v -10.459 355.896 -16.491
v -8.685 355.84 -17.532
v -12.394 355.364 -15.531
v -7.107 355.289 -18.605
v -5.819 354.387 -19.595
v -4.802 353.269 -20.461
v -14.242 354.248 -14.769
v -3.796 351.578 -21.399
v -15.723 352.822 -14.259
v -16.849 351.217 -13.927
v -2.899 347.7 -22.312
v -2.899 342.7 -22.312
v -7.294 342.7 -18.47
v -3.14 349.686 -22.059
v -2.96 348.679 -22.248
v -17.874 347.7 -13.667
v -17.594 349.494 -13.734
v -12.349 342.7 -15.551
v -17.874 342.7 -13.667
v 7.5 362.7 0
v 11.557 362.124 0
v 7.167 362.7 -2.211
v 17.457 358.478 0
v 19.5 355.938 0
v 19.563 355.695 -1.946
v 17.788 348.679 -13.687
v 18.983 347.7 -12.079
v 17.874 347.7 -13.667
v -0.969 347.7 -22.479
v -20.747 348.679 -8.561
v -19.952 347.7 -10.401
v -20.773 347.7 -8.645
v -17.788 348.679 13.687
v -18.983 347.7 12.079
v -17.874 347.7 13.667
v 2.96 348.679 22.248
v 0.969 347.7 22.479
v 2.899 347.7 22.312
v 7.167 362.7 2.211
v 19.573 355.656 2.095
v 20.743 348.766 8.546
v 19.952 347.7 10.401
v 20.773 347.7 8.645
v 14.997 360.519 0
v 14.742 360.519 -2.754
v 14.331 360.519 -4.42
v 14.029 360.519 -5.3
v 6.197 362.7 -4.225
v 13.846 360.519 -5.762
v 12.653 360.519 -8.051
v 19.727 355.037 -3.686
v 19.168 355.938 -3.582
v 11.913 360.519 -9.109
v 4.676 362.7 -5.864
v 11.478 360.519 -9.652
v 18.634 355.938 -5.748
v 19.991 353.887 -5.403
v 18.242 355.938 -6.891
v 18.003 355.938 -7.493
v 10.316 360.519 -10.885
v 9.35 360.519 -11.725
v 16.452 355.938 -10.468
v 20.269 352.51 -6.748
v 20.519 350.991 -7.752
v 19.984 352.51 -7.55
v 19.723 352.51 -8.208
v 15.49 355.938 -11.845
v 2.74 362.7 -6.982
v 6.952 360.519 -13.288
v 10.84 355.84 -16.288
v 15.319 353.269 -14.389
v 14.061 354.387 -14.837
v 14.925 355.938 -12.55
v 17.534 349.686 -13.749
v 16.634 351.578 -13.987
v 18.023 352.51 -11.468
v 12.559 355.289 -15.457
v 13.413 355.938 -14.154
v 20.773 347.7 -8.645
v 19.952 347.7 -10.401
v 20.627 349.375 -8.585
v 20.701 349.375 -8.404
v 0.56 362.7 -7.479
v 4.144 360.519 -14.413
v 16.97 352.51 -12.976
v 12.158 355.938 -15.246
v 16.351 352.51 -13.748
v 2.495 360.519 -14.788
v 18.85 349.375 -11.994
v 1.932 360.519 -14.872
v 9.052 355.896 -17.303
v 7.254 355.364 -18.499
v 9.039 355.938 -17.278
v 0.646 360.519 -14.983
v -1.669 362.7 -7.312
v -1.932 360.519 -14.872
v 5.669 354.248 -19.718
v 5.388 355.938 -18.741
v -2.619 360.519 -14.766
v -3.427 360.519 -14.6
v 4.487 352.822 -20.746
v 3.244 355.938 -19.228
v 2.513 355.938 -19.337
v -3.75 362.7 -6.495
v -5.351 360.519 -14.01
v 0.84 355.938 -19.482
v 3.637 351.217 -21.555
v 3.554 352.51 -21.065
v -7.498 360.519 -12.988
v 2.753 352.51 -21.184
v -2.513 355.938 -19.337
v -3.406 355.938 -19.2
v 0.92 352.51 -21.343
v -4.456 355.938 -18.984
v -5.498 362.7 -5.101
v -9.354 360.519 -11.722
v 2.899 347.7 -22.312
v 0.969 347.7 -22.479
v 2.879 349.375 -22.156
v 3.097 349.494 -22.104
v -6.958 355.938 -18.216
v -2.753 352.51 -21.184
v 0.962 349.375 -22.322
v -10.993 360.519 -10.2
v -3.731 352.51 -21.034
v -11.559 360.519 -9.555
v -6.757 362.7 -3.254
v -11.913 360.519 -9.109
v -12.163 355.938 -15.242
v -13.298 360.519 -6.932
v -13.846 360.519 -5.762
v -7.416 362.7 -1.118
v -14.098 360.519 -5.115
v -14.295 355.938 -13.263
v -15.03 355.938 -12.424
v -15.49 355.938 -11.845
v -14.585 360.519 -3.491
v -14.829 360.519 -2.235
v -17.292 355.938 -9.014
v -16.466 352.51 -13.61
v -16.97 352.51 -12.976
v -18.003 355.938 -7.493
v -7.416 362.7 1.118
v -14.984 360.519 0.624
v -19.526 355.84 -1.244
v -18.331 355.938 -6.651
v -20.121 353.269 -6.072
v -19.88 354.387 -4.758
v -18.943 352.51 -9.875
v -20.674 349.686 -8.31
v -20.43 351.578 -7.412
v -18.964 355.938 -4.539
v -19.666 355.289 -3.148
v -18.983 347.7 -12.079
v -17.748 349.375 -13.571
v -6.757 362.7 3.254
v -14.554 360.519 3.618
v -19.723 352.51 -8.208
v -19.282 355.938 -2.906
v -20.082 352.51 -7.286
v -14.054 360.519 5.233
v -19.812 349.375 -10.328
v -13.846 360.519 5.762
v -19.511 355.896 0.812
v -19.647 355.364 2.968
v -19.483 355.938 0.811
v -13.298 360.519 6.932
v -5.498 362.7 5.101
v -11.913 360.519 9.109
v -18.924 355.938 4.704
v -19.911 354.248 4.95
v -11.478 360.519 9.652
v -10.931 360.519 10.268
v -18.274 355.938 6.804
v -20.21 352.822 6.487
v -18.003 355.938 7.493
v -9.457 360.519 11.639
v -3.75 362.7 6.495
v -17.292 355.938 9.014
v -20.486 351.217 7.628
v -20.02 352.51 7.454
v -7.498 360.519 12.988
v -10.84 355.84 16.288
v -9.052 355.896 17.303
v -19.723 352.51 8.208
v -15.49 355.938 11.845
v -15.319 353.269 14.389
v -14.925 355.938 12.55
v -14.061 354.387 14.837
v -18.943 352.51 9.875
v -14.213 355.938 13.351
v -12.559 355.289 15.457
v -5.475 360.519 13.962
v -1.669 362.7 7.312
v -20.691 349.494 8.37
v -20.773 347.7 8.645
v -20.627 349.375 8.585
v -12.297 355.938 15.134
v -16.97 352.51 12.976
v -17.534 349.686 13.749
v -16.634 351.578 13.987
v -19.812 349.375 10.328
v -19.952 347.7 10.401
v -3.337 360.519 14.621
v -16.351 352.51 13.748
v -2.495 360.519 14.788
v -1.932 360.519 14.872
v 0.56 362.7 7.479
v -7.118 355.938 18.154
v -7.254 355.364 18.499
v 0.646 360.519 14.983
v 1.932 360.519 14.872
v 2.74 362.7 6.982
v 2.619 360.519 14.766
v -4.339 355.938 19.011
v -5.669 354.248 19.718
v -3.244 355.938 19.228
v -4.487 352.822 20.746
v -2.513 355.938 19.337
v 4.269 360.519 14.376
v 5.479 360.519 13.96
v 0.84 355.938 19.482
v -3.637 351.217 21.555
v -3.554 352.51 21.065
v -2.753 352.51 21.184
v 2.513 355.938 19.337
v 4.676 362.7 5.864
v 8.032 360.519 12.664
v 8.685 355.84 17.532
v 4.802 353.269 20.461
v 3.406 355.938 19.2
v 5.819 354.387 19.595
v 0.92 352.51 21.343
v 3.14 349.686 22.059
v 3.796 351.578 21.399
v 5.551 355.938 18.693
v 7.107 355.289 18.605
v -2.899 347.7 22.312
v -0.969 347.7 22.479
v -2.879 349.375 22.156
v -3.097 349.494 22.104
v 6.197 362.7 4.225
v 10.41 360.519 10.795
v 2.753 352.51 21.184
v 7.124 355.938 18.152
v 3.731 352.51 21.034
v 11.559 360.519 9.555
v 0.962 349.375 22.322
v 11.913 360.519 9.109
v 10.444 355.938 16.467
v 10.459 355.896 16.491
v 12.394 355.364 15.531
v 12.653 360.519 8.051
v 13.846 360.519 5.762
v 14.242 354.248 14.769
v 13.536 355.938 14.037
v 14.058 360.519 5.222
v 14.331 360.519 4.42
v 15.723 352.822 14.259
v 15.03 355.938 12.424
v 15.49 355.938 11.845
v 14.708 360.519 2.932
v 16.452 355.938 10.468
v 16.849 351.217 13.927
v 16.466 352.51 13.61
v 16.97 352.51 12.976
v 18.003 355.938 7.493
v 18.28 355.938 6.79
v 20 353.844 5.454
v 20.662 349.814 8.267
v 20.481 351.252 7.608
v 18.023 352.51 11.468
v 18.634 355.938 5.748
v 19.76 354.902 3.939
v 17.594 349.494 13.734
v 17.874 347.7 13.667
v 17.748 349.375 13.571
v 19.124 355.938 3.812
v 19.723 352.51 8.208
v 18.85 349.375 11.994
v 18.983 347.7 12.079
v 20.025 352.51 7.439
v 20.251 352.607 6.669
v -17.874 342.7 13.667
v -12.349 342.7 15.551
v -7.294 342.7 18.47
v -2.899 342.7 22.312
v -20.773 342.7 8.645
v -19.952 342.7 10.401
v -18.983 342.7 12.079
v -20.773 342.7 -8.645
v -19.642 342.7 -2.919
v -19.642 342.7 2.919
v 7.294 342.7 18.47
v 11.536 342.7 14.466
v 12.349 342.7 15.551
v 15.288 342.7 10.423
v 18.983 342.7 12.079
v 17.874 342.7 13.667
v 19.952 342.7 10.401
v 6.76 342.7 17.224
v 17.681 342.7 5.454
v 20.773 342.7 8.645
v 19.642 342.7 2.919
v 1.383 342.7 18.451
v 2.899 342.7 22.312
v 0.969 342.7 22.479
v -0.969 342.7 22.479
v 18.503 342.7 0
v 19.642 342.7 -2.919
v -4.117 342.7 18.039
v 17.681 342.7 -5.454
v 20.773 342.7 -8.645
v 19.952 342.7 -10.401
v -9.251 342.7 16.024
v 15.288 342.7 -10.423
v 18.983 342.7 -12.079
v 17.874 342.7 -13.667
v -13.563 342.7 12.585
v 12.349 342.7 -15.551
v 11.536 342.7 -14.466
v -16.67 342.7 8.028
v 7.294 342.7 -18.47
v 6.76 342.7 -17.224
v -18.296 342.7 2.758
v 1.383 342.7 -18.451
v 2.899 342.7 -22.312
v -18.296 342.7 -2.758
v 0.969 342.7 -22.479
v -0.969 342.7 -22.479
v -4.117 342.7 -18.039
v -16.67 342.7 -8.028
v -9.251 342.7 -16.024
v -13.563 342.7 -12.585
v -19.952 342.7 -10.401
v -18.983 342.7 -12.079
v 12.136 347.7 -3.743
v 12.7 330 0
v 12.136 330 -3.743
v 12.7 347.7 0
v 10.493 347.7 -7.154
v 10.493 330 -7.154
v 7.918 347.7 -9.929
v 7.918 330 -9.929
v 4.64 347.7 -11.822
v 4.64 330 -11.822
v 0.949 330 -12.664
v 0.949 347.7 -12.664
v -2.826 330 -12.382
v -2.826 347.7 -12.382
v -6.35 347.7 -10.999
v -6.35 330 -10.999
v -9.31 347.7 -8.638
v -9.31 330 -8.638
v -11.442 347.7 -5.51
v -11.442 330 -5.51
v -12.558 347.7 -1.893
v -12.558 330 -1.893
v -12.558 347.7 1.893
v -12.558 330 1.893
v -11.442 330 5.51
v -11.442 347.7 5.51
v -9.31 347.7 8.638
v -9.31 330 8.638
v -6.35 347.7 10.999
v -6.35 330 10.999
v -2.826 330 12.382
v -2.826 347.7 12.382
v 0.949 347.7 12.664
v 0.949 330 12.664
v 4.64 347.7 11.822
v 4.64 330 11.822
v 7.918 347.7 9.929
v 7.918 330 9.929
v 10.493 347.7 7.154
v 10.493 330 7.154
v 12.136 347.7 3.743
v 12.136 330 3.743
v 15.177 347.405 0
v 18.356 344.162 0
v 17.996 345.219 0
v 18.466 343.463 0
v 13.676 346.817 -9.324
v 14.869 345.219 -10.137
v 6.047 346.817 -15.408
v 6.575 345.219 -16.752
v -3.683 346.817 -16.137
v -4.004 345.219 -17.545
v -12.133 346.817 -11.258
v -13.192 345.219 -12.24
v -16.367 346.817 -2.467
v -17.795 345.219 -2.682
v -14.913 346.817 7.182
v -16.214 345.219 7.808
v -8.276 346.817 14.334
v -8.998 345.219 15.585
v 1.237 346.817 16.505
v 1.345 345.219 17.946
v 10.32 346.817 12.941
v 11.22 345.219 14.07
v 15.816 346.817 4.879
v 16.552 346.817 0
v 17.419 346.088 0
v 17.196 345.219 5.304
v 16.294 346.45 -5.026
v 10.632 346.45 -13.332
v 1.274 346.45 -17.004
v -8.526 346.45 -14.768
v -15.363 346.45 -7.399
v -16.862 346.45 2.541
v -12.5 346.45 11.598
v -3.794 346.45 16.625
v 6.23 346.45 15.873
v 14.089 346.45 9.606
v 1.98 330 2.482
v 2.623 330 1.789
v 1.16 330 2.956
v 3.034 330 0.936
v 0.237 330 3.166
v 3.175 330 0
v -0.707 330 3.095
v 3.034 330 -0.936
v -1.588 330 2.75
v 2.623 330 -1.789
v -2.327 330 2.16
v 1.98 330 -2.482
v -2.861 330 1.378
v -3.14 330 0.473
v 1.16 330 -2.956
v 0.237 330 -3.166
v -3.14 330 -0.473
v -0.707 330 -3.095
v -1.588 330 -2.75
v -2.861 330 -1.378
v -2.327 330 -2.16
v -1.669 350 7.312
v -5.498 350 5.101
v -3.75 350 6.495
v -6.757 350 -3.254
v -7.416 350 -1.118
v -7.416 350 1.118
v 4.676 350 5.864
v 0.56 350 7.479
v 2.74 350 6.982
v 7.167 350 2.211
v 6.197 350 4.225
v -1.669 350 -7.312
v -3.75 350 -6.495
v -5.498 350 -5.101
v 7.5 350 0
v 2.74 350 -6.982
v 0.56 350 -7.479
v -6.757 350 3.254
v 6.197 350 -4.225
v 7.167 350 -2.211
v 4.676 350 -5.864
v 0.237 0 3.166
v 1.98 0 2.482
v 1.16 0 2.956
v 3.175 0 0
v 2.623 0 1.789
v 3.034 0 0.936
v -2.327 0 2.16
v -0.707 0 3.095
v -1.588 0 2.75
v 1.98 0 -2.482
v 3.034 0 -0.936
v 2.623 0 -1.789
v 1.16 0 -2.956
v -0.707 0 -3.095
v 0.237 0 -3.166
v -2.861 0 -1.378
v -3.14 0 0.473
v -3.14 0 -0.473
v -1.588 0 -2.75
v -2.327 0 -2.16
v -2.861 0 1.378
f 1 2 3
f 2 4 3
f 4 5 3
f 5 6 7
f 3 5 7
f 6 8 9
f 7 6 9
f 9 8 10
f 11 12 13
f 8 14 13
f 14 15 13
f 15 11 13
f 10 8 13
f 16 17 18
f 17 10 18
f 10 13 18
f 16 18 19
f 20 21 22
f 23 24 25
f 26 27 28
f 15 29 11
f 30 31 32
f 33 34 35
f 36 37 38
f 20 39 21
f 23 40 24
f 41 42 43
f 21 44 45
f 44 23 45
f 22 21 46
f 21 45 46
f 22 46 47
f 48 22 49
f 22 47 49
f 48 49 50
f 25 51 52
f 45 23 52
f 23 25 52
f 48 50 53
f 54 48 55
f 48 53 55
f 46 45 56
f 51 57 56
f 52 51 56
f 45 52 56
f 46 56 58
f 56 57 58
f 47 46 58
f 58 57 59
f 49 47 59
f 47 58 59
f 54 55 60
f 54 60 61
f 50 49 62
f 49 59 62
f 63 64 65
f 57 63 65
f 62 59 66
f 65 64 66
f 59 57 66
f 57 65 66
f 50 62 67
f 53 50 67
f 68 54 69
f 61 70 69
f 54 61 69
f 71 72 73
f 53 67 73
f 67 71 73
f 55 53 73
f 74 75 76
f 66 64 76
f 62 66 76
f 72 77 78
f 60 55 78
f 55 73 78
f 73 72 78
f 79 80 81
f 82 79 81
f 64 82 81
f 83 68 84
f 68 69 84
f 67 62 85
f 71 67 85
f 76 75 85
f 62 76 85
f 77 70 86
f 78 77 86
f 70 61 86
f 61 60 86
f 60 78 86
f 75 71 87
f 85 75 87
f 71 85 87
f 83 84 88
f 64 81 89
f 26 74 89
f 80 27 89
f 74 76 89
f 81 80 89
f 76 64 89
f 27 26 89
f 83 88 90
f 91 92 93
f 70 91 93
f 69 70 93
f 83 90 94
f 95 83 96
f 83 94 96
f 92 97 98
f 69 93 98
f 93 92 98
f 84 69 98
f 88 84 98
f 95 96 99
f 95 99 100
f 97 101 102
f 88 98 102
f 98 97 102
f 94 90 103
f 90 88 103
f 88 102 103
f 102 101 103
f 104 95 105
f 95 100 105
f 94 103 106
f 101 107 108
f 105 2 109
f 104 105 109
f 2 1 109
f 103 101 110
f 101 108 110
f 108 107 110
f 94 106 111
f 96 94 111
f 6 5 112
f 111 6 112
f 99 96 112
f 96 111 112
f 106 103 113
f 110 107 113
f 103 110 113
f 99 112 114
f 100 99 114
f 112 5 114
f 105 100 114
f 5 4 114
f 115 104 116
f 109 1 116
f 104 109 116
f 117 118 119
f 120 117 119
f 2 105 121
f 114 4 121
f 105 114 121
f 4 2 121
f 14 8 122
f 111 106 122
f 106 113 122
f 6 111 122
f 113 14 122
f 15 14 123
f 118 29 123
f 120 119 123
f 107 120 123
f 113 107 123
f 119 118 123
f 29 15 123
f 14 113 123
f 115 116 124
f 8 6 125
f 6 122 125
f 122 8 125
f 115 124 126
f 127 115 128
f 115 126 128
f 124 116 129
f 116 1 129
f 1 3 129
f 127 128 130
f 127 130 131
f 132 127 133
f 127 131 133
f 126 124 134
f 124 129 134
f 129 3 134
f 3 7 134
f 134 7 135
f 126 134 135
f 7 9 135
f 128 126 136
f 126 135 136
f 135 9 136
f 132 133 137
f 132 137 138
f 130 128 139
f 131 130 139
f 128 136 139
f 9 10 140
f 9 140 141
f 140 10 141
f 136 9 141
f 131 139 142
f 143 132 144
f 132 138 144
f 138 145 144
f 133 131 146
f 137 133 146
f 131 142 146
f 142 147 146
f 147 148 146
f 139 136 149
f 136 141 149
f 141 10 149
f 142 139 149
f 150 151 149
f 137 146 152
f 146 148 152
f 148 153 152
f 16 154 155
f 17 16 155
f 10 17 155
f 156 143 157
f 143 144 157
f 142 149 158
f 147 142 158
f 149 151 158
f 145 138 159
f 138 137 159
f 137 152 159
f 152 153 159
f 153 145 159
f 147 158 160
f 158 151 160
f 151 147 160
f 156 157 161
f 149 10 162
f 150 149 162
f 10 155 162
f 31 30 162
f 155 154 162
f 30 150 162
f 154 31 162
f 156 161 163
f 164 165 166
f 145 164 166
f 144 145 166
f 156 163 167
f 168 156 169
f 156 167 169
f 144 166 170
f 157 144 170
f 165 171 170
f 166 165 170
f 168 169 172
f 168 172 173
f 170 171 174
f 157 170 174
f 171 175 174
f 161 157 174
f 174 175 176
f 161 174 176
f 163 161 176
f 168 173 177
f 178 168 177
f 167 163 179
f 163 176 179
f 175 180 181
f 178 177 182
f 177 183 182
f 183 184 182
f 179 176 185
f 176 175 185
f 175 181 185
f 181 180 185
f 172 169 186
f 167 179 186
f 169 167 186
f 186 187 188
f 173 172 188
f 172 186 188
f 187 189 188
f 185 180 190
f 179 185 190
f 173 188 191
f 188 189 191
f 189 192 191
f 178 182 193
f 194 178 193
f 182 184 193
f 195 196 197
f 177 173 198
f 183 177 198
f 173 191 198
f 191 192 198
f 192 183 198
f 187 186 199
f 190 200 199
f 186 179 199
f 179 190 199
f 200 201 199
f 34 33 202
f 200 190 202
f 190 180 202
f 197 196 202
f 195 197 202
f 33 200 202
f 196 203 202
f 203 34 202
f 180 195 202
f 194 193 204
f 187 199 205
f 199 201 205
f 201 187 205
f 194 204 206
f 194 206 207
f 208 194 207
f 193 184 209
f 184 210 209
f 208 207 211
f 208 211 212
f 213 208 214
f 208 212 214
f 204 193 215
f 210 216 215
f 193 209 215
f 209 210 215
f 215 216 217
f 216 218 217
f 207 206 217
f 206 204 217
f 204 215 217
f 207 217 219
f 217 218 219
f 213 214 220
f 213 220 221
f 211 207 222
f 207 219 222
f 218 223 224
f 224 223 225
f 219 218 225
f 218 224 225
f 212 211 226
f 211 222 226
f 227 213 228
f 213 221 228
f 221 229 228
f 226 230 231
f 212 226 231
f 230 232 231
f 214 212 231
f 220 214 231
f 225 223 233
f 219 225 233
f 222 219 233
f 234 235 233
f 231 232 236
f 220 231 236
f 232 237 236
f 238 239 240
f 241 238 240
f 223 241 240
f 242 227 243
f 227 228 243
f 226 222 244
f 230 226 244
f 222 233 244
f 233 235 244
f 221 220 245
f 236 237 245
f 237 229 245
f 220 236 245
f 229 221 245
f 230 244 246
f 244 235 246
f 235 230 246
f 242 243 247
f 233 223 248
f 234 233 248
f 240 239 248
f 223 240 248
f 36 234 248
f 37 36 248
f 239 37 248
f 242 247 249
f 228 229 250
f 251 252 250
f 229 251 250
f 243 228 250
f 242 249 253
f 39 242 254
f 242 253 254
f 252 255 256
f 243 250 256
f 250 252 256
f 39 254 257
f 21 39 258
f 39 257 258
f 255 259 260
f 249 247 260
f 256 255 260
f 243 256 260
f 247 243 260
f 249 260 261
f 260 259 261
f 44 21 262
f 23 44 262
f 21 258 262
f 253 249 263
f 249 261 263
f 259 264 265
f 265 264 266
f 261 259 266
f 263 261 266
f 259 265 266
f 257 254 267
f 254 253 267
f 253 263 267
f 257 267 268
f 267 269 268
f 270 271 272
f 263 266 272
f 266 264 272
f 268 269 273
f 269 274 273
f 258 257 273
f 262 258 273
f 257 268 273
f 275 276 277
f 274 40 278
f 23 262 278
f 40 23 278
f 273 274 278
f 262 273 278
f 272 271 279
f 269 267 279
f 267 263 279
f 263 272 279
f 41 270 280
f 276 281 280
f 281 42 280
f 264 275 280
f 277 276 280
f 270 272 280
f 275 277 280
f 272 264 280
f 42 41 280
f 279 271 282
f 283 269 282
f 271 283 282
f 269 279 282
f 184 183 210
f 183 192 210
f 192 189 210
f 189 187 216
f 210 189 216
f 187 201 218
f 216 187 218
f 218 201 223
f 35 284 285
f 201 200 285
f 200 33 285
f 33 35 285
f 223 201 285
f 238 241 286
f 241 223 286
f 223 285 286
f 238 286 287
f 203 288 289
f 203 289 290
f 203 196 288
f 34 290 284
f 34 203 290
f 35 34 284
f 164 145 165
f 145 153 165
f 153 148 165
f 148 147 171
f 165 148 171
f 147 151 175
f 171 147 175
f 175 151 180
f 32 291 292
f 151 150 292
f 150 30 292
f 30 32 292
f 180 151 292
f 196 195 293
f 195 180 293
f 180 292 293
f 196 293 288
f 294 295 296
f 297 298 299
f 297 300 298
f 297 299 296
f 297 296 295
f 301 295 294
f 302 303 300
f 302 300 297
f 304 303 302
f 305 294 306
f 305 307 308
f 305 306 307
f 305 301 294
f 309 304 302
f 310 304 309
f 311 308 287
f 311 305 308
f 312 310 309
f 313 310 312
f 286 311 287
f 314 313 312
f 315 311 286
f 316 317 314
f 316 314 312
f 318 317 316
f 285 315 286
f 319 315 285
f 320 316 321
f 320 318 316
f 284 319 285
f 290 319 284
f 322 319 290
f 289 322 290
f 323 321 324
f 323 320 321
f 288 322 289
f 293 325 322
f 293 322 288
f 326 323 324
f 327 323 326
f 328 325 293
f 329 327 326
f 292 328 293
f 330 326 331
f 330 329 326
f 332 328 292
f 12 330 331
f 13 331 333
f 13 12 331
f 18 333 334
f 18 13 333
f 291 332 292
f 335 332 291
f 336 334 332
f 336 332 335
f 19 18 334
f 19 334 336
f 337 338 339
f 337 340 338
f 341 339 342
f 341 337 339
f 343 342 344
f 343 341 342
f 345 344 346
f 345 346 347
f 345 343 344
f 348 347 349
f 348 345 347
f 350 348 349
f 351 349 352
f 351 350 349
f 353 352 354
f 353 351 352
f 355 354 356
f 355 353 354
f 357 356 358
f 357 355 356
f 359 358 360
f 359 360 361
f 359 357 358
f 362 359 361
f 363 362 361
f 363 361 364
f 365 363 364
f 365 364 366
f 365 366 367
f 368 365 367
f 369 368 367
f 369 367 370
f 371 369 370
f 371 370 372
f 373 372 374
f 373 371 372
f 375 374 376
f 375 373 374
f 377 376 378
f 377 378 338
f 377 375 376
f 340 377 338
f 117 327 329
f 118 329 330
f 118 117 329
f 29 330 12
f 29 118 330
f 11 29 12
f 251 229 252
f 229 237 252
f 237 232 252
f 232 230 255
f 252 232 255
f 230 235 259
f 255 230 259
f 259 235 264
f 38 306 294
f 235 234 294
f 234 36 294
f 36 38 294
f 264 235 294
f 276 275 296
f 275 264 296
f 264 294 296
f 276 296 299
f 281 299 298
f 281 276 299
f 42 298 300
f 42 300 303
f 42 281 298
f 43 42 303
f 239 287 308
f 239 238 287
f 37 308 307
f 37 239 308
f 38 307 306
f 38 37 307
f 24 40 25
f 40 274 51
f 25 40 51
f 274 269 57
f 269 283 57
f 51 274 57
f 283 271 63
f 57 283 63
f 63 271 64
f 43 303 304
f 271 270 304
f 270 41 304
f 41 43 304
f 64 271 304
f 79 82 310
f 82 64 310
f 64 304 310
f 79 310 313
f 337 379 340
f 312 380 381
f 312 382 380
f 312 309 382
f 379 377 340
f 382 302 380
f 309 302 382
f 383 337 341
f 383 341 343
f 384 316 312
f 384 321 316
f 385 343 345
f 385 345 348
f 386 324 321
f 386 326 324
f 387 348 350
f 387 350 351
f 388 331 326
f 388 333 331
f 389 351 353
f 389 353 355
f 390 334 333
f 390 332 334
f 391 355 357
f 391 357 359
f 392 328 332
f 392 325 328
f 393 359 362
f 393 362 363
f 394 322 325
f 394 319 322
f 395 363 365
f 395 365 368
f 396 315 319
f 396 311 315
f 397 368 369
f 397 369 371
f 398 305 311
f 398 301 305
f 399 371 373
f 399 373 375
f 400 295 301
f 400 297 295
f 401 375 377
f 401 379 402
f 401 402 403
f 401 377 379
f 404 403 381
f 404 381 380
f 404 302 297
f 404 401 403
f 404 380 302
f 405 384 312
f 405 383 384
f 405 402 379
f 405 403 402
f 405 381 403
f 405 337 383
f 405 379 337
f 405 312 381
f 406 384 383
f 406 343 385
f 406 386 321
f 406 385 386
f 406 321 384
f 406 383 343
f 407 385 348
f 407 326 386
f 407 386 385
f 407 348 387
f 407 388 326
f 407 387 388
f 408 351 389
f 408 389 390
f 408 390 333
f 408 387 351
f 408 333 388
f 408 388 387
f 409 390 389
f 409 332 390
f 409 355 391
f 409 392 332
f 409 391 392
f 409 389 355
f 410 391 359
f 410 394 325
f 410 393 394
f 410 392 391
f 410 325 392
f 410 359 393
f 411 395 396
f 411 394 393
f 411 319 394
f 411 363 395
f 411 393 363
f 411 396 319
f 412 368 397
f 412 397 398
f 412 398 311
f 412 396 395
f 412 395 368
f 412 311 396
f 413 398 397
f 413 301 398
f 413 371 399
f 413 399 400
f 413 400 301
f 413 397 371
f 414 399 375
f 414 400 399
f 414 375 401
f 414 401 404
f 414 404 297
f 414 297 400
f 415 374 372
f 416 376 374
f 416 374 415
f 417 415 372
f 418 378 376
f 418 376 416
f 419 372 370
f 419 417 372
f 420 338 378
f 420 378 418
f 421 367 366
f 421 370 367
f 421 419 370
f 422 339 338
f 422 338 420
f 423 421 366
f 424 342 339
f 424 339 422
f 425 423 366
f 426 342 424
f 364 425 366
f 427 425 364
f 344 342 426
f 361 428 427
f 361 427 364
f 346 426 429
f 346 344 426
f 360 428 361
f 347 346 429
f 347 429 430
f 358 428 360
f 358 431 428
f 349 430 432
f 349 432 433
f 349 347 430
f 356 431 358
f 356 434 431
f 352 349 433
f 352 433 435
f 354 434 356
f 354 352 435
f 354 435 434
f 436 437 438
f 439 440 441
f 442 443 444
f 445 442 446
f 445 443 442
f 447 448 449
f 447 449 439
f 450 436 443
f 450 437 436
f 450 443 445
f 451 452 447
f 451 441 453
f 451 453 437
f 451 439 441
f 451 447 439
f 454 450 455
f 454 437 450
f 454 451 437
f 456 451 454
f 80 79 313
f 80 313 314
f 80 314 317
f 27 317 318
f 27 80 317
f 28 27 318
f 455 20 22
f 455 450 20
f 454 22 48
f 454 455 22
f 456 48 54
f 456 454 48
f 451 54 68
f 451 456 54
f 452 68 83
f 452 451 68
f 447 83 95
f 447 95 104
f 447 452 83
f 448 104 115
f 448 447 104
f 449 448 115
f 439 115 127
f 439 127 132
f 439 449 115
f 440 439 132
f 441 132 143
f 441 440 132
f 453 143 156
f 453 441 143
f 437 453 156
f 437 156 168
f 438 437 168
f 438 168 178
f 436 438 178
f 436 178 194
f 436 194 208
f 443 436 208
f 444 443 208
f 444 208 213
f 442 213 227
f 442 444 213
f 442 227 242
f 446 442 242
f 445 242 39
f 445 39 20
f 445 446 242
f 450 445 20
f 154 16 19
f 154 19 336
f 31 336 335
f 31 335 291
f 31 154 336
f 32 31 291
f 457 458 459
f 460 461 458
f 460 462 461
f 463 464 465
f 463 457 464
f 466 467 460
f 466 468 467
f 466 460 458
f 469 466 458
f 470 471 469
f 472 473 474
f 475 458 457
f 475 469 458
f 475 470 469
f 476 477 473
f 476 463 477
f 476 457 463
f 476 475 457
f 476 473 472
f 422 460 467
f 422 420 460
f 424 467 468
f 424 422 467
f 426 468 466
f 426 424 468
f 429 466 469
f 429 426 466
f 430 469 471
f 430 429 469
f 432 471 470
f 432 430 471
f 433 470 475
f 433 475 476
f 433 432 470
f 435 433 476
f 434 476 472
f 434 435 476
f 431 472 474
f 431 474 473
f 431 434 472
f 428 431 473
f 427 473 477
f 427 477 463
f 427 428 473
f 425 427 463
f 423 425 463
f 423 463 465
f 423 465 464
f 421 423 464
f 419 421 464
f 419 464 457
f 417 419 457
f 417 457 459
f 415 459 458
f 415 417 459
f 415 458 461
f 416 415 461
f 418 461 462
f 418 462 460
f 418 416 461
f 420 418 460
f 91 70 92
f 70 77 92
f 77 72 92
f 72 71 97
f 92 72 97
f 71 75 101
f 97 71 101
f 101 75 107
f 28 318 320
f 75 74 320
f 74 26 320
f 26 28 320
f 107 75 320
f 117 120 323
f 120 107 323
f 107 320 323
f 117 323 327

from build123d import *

# Parameters (mm, degrees)
CORTAR_EXTRUIR1_DEPTH = 345.174069344


with BuildPart() as part:
    # Croquis2 → Revolución1 (revolve)
    with BuildSketch(Plane.XY):
        with BuildLine():
            Line((3.175, 330), (12.7, 330))
            Line((12.7, 330), (12.7, 347.7))
            add(Edge.make_bspline(
                [(12.7, 347.7), (18.502741551, 347.7), (18.502741551, 342.7)],
                knots=[0, 0, 0, 1, 1, 1], degree=2))
            Line((18.502741551, 342.7), (22.5, 342.7))
            Line((22.5, 342.7), (22.5, 347.7))
            add(Edge.make_bspline(
                [(7.5, 362.7), (13.78939178, 362.7), (19.76753999, 357.472351461), (22.5, 349.738947382), (22.5, 347.7)],
                knots=[0, 0, 0, 0, 0.720044841, 1, 1, 1, 1], degree=3))
            Line((7.5, 362.7), (7.5, 350))
            Line((7.5, 350), (0, 350))
            Line((0, 350), (0, 0))
            Line((0, 0), (3.175, 0))
            Line((3.175, 0), (3.175, 330))
        make_face()
    revolve(axis=Axis((0, 0, 0), (0, 1, 0)))

    # Croquis3 → Cortar-Extruir1 (cut, through all)
    with BuildSketch(Plane.XZ.offset(-342.7)):
        with BuildLine():
            ThreePointArc((20.772727273, 8.645449766), (19.5, 0), (20.772727273, -8.645449766))
            ThreePointArc((20.772727273, -8.645449766), (22.5, 0), (20.772727273, 8.645449766))
        make_face()
        with BuildLine():
            ThreePointArc((17.873542761, -13.666984641), (9.75, -16.887495374), (2.899184512, -22.312434407))
            ThreePointArc((2.899184512, -22.312434407), (11.25, -19.485571585), (17.873542761, -13.666984641))
        make_face()
        with BuildLine():
            ThreePointArc((-2.899184512, -22.312434407), (-9.75, -16.887495374), (-17.873542761, -13.666984641))
            ThreePointArc((-17.873542761, -13.666984641), (-11.25, -19.485571585), (-2.899184512, -22.312434407))
        make_face()
        with BuildLine():
            ThreePointArc((-20.772727273, -8.645449766), (-19.5, 0), (-20.772727273, 8.645449766))
            ThreePointArc((-20.772727273, 8.645449766), (-22.5, 0), (-20.772727273, -8.645449766))
        make_face()
        with BuildLine():
            ThreePointArc((-17.873542761, 13.666984641), (-9.75, 16.887495374), (-2.899184512, 22.312434407))
            ThreePointArc((-2.899184512, 22.312434407), (-11.25, 19.485571585), (-17.873542761, 13.666984641))
        make_face()
        with BuildLine():
            ThreePointArc((2.899184512, 22.312434407), (9.75, 16.887495374), (17.873542761, 13.666984641))
            ThreePointArc((17.873542761, 13.666984641), (11.25, 19.485571585), (2.899184512, 22.312434407))
        make_face()
    extrude(amount=-CORTAR_EXTRUIR1_DEPTH, mode=Mode.SUBTRACT)


solid = part.part
